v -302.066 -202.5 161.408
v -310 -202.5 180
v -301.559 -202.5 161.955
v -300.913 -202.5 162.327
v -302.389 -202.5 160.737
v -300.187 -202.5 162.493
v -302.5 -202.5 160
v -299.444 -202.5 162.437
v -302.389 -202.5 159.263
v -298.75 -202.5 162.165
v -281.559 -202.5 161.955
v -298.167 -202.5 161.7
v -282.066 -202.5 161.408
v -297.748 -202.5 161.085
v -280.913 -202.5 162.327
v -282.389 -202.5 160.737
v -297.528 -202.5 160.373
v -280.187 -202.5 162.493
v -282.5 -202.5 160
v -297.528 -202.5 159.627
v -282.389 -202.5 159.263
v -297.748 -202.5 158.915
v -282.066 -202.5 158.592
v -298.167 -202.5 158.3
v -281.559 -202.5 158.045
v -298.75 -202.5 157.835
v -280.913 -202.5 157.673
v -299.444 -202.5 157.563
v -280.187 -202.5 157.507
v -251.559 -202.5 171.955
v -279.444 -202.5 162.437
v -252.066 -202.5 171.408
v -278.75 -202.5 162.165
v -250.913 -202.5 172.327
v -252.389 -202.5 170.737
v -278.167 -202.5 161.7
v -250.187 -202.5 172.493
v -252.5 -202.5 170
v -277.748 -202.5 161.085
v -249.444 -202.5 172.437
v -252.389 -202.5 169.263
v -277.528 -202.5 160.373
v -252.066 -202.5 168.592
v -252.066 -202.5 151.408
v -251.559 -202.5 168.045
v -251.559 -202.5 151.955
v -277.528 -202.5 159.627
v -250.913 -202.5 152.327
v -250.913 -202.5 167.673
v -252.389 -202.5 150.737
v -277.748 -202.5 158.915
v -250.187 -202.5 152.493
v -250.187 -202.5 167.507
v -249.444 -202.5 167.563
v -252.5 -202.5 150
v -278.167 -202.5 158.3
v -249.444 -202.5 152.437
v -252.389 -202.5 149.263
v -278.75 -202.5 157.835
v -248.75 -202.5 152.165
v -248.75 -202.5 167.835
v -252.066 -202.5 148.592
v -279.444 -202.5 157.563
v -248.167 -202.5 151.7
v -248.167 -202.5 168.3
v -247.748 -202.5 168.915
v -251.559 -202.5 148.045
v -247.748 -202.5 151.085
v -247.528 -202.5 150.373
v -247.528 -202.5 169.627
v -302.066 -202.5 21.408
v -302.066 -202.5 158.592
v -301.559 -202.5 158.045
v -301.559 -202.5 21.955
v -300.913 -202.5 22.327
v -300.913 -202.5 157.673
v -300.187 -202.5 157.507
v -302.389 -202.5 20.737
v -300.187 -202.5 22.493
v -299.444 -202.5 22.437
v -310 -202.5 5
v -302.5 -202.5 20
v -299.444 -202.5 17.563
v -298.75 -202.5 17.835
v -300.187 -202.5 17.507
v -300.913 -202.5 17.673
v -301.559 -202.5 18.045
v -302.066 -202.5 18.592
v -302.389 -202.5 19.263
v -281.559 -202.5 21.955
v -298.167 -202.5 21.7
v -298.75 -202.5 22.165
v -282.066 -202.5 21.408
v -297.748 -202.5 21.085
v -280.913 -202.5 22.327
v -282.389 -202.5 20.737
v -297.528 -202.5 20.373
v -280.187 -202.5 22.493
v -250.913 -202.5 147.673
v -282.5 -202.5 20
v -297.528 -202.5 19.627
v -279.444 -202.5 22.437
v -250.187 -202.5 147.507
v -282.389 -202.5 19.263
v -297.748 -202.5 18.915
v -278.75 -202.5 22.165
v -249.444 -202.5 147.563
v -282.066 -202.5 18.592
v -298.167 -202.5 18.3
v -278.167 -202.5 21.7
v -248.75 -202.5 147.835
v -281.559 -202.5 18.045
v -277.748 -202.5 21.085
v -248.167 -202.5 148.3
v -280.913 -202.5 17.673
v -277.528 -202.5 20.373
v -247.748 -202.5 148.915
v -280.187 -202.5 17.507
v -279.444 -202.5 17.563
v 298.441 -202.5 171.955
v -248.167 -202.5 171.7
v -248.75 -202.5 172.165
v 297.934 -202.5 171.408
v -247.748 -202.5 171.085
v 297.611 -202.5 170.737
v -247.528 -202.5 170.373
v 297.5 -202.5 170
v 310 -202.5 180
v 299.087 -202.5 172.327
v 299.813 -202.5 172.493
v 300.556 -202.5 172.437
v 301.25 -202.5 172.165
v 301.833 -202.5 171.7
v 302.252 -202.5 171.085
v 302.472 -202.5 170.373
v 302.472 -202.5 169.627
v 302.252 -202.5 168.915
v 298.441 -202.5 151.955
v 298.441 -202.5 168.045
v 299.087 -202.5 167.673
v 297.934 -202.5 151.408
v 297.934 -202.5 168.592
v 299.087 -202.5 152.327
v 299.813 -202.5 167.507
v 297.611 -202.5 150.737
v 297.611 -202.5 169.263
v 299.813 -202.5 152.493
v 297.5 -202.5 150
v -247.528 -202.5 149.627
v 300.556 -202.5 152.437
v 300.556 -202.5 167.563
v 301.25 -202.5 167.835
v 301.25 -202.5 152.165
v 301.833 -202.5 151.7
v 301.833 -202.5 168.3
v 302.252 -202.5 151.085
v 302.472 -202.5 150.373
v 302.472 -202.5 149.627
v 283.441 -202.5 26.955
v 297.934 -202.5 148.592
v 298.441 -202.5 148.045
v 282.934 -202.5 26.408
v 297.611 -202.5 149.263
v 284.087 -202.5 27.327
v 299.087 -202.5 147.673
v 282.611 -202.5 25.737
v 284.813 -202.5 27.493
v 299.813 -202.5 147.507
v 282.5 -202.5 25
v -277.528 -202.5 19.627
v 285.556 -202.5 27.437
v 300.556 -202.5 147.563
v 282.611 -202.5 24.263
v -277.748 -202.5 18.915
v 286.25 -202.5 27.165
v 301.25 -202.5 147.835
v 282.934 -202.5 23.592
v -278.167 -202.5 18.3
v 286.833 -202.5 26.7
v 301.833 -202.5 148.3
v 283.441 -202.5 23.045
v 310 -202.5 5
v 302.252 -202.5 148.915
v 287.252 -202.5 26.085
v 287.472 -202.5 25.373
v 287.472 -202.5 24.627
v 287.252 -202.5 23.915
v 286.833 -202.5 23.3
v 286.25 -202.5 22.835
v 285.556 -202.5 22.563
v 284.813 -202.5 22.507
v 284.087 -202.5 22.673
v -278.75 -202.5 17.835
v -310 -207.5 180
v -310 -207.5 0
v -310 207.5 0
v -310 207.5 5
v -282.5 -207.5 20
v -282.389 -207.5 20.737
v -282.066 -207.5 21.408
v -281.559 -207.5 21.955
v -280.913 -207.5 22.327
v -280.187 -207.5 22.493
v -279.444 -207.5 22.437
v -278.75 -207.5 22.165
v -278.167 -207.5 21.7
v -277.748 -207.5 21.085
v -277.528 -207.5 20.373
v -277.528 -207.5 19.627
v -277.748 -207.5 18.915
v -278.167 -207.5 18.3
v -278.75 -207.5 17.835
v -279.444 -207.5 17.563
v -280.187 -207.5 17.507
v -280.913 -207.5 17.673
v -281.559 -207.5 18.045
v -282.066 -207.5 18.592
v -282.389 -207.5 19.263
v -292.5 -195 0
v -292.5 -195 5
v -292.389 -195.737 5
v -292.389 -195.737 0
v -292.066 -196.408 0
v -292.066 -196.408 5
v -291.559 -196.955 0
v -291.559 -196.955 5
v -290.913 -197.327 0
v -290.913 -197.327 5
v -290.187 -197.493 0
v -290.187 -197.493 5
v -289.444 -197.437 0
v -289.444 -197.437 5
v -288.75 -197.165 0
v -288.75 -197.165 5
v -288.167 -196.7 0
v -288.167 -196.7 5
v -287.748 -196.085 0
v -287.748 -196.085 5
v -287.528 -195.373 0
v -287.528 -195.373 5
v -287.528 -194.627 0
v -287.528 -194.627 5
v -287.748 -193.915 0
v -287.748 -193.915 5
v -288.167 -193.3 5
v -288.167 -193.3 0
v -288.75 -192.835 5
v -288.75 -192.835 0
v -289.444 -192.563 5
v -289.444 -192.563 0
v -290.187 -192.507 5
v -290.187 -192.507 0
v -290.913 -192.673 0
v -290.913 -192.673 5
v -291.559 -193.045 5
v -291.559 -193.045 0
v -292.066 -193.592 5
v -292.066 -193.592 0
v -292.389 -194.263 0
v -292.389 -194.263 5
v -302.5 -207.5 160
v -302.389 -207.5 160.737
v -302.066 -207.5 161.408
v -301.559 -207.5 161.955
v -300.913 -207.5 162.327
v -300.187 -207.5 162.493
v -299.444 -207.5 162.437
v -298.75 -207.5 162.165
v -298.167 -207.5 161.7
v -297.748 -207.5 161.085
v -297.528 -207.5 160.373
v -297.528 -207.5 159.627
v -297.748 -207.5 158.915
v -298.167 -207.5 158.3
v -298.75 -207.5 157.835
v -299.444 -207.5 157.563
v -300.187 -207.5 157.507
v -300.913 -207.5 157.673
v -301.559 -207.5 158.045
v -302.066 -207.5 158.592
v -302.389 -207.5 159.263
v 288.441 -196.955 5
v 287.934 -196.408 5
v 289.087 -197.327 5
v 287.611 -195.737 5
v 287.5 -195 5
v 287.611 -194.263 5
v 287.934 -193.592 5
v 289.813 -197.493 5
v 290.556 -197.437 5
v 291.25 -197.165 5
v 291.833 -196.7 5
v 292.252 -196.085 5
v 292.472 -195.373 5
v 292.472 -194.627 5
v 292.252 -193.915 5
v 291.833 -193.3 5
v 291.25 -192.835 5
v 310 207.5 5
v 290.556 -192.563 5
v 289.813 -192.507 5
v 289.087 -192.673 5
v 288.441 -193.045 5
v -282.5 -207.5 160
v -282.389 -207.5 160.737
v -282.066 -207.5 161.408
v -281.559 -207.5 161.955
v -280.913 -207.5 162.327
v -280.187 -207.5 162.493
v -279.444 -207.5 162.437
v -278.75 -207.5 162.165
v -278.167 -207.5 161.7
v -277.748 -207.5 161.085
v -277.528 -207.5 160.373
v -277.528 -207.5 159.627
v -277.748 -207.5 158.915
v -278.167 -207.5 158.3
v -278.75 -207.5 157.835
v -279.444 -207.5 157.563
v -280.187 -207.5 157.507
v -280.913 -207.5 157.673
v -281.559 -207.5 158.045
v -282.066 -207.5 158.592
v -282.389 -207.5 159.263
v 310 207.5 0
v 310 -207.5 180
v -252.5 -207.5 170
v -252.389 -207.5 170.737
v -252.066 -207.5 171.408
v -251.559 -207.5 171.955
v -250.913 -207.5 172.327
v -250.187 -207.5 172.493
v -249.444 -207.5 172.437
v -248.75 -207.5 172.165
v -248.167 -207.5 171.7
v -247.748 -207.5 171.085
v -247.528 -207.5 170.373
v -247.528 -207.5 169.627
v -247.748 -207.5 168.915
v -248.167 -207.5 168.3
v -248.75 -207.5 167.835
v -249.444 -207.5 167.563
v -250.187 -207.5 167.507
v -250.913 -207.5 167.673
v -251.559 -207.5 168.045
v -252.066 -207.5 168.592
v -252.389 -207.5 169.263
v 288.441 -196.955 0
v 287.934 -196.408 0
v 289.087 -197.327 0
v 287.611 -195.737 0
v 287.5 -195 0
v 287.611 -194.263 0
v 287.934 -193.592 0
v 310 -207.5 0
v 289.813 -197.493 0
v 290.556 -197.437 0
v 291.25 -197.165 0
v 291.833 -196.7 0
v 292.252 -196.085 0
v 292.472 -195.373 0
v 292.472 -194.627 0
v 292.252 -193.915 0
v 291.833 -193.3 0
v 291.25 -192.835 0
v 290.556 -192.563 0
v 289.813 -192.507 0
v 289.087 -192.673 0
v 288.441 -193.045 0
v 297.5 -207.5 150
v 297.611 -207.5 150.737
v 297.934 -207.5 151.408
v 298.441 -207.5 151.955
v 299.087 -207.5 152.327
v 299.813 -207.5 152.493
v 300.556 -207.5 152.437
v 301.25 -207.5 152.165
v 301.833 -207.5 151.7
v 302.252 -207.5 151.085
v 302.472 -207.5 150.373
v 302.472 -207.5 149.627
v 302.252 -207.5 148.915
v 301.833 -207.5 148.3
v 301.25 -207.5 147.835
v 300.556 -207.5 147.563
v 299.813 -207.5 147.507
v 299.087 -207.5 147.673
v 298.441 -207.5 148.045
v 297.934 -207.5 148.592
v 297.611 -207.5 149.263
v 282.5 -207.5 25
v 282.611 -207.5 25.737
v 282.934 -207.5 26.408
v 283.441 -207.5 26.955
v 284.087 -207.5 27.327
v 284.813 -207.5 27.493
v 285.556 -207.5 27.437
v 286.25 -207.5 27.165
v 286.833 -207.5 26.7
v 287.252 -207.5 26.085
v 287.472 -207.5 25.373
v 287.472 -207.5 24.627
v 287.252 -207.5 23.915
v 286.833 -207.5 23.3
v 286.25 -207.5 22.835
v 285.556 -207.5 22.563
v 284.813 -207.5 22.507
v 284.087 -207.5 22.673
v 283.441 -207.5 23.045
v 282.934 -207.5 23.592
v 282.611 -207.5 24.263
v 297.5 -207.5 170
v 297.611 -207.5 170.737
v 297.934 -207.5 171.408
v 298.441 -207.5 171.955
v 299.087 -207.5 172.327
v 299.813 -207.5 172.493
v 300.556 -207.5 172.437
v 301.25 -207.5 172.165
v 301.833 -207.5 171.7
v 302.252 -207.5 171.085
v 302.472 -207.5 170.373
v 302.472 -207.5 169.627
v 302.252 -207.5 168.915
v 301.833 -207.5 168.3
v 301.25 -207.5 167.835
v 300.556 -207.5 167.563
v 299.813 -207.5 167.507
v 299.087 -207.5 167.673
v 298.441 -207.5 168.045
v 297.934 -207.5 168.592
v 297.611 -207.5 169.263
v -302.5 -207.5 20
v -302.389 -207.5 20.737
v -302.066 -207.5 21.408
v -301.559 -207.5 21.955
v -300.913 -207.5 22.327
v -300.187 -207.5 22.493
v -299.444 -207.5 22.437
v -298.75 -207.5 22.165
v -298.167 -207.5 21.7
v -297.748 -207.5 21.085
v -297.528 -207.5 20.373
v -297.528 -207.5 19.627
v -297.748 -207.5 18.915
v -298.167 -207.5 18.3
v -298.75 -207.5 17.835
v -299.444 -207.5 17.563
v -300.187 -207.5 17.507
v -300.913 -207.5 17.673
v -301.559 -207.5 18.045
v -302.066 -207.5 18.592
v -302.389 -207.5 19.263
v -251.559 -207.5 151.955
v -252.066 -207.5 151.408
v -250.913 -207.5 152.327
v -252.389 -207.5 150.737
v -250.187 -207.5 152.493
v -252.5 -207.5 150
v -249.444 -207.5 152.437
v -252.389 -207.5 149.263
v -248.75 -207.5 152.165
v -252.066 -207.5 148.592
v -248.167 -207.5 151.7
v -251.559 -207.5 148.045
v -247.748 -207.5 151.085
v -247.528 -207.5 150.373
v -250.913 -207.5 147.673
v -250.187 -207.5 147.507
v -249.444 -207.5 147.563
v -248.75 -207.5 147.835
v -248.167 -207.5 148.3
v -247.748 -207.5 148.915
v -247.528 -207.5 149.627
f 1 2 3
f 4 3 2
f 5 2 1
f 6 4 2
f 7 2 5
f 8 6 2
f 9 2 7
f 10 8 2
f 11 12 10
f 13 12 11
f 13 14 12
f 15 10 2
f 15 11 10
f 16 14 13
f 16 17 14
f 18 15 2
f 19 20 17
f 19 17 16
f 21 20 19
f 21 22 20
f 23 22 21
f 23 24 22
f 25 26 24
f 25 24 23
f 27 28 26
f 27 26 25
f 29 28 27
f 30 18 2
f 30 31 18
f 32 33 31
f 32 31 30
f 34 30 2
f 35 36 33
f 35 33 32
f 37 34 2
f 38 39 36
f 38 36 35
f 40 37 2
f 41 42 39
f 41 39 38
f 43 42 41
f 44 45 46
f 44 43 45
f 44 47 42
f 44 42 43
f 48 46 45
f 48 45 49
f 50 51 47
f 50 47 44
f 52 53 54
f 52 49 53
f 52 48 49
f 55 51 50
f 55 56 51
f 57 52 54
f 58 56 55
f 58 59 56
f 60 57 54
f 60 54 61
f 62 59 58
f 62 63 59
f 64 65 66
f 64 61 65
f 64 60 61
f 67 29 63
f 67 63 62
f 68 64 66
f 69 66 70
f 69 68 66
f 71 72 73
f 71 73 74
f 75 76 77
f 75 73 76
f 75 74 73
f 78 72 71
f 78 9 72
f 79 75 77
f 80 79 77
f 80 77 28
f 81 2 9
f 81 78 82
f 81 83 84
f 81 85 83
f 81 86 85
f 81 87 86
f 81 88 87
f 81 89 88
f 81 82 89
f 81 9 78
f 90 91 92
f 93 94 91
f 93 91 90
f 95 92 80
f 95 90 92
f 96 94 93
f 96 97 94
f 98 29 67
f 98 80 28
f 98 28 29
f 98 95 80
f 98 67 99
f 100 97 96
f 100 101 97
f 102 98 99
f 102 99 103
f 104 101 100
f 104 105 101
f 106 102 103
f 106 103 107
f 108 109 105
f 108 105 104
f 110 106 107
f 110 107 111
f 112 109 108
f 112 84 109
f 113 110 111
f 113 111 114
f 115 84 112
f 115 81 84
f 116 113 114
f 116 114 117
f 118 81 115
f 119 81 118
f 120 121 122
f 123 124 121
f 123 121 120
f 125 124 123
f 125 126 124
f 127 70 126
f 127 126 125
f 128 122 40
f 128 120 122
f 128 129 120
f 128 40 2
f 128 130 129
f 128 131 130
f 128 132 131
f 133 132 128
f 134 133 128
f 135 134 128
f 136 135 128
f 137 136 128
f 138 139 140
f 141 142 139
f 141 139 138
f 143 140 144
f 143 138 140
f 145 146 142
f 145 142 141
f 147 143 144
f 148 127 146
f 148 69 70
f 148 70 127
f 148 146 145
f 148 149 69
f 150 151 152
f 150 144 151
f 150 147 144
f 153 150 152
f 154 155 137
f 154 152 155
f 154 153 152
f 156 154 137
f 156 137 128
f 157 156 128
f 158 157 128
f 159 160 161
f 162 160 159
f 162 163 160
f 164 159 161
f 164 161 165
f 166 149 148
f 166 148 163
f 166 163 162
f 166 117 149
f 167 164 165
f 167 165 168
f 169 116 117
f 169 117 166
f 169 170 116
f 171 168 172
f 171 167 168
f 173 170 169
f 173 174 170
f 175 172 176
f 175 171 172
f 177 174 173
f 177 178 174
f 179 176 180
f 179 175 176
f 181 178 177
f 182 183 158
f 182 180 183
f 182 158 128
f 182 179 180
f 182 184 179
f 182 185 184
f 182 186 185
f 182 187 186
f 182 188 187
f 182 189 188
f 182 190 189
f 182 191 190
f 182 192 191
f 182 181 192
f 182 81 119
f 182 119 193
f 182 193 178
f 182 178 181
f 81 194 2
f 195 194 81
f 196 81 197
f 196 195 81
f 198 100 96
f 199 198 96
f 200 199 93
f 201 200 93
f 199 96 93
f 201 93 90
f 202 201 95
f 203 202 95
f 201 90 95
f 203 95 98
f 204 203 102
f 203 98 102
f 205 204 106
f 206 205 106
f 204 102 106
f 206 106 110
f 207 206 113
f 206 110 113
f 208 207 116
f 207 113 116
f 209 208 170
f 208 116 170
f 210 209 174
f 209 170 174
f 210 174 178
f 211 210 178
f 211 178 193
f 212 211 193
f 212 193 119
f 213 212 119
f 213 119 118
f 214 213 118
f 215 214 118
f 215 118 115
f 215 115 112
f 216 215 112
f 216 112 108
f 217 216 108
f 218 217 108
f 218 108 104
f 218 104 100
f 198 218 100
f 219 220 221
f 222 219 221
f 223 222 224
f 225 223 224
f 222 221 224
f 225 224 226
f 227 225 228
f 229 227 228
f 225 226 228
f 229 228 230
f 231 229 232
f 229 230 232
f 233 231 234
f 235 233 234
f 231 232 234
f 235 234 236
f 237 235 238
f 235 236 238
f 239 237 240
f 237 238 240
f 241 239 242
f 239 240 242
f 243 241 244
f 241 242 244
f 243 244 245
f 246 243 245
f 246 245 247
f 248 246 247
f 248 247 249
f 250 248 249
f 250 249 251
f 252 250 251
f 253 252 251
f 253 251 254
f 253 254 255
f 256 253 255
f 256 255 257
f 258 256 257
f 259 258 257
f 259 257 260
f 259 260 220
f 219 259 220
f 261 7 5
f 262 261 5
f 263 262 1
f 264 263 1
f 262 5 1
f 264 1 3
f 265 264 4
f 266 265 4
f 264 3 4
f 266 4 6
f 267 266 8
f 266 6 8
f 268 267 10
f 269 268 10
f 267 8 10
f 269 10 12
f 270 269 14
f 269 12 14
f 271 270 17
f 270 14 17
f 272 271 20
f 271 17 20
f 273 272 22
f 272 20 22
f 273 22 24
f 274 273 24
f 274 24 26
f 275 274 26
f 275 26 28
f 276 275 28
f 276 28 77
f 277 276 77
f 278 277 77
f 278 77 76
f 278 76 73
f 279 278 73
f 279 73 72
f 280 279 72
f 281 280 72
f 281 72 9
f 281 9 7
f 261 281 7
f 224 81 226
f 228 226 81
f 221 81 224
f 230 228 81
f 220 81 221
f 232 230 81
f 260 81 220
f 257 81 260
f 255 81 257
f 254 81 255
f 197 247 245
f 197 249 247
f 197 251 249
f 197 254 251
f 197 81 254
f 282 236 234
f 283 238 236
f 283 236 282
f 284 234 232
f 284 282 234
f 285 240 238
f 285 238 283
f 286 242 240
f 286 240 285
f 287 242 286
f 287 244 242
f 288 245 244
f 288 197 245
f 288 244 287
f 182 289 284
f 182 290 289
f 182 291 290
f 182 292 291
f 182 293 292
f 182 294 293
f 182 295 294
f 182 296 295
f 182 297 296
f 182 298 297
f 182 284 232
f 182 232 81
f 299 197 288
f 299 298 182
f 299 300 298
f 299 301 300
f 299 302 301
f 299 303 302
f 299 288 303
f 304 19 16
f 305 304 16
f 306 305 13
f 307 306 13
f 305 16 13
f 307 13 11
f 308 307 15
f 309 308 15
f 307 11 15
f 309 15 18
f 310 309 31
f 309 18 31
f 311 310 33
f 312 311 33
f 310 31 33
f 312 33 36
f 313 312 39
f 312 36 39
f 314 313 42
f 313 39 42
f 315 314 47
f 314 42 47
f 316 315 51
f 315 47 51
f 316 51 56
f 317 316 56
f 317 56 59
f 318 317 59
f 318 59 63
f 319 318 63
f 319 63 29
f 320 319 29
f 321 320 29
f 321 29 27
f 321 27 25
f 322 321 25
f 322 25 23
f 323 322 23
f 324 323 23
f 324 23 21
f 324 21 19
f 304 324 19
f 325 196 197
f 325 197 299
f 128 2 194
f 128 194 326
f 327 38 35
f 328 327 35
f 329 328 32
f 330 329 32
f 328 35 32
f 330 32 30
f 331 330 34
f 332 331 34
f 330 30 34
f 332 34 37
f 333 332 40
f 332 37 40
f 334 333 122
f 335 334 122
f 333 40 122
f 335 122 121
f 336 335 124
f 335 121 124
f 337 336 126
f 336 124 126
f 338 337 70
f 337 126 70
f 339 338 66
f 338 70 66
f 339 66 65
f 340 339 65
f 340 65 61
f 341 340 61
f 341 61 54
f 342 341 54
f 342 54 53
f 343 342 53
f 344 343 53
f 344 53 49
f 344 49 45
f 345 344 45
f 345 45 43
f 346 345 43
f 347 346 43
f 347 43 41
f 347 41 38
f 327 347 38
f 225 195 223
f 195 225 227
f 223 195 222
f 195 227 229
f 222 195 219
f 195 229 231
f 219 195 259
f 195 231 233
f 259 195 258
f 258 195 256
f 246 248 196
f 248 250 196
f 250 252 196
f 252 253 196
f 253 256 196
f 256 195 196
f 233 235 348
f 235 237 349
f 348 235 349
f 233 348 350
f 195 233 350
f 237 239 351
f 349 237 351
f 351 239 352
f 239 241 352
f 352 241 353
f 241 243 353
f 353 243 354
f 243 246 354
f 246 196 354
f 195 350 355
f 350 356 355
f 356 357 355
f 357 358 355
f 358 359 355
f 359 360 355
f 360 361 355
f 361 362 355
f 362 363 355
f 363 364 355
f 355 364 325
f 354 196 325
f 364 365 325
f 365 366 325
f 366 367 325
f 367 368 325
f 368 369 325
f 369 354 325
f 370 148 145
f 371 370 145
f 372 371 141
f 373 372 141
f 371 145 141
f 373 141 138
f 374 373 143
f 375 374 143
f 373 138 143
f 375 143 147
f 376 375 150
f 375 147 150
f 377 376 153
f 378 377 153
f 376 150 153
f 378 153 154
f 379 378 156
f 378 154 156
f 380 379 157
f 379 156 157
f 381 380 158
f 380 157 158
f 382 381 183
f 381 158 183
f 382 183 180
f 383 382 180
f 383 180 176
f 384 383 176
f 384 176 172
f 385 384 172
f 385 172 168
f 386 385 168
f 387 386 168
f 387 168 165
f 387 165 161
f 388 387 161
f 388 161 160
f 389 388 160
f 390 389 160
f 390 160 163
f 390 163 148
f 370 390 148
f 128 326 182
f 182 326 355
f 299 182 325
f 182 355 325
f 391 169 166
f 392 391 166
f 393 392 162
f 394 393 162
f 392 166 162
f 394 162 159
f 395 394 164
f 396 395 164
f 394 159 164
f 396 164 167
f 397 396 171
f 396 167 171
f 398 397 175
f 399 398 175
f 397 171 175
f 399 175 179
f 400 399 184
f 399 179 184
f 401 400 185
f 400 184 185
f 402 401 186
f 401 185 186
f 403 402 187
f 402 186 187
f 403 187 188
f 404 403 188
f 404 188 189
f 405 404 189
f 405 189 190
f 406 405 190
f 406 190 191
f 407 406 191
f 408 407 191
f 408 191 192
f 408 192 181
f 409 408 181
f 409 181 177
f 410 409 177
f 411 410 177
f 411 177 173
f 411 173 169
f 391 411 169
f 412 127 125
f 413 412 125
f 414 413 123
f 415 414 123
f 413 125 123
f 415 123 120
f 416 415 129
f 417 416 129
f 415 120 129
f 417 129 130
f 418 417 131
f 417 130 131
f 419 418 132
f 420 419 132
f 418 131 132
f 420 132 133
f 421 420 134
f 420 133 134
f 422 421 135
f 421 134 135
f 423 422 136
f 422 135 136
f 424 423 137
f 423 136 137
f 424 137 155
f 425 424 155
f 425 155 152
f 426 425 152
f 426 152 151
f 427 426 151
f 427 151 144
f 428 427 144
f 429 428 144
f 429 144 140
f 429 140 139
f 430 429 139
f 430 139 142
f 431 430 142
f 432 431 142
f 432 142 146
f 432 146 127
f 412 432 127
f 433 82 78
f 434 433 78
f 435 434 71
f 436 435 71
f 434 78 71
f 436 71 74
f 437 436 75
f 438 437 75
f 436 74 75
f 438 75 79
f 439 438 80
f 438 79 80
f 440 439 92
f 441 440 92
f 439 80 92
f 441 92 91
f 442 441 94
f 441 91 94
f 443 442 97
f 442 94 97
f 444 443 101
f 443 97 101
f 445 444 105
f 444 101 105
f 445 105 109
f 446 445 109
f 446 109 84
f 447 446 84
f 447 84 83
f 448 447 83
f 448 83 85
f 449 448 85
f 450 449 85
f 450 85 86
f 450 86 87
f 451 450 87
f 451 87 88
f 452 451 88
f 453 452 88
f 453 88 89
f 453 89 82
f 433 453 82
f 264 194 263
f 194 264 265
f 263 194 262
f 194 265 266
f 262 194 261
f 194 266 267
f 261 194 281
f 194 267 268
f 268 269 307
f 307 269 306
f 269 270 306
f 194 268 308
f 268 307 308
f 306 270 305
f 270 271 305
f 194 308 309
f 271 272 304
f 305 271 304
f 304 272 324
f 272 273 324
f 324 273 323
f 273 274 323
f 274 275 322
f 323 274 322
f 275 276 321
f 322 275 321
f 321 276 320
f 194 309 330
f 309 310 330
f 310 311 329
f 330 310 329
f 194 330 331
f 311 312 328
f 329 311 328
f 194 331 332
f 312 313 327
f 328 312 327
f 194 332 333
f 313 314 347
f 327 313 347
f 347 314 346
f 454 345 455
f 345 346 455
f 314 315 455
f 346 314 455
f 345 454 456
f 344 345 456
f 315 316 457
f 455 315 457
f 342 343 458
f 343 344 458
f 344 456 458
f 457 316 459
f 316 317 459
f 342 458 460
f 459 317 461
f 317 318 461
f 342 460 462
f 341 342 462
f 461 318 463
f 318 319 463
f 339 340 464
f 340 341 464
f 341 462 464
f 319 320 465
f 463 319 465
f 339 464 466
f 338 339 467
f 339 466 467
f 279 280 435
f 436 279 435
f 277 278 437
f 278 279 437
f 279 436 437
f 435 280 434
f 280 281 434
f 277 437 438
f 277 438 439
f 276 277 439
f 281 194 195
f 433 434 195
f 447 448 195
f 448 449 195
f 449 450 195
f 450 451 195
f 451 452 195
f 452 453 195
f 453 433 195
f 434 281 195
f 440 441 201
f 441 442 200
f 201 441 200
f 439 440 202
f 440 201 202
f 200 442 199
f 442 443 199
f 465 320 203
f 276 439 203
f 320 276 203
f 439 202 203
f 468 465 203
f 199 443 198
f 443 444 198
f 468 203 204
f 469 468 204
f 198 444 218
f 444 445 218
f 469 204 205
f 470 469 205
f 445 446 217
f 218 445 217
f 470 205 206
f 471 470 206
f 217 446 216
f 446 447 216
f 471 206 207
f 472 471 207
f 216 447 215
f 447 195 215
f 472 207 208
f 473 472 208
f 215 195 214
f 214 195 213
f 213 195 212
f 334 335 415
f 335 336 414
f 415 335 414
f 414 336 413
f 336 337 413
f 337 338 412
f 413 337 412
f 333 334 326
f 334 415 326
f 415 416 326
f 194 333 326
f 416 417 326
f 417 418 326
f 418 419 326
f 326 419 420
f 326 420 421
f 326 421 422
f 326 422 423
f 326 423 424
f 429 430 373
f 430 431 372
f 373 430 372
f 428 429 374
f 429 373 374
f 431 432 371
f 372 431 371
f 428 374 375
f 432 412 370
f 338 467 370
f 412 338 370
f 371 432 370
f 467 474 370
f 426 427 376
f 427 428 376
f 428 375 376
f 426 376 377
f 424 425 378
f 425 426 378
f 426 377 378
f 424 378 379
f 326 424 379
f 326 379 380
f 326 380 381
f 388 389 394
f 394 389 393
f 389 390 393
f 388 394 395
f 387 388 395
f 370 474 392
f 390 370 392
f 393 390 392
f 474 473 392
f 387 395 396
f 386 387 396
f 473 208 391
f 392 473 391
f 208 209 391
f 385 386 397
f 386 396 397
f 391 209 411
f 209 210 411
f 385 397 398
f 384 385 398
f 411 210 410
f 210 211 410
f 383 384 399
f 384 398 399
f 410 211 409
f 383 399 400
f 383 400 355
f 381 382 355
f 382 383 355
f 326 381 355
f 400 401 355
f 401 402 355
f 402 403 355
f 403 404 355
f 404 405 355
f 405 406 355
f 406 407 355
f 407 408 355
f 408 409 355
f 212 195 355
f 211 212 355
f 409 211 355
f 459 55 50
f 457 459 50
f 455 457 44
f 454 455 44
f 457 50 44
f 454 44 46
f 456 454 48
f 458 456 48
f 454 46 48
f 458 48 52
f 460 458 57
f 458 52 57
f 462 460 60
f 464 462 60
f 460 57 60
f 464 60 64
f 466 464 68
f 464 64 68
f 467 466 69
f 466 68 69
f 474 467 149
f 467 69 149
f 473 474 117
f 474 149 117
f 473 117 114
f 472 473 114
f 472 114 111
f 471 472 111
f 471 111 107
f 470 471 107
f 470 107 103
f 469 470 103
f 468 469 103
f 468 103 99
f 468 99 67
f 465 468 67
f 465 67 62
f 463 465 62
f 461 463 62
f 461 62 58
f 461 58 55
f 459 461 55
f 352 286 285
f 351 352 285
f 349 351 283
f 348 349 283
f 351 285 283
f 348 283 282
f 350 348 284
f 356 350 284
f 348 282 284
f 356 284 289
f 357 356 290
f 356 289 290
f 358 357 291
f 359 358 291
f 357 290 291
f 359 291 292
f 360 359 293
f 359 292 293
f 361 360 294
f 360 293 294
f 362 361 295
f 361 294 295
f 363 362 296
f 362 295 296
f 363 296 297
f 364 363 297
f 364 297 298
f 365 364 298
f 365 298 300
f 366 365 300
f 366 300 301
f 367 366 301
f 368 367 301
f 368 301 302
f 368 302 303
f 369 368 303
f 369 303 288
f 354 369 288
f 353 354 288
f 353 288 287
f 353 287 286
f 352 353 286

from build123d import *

# Parameters (mm, degrees)
F0_W      = 620
F0_H      = 415
F1_DEPTH  = 5
F2_W      = 620
F2_H      = 5
F3_DEPTH  = 175
F5_D      = 5
F7_D      = 5
F9_D      = 5
F11_D     = 5
F15_D     = 5
F17_D     = 5
F19_D     = 5
F19_DEPTH = 11
F20_D     = 5
F20_DEPTH = 11


with BuildPart() as f1:
    # F0 (on Top) → F1 (new body)
    with BuildSketch(Plane.XY):
        Rectangle(F0_W, F0_H)
    extrude(amount=F1_DEPTH)

    # F2 (on face) → F3 (join)
    with BuildSketch(Plane.XY.offset(5)):
        with Locations((0, -205)):
            Rectangle(F2_W, F2_H)
    extrude(amount=F3_DEPTH)

    # F5 (through all)
    with Locations(Plane.XZ.offset(207.5)):
        with Locations((300, 170)):
            Hole(F5_D / 2)

    # F7 (through all)
    with Locations(Plane.XZ.offset(207.5)):
        with Locations((300, 150)):
            Hole(F7_D / 2)

    # F9 (through all)
    with Locations(Plane.XZ.offset(207.5)):
        with Locations((-250, 170)):
            Hole(F9_D / 2)

    # F11 (through all)
    with Locations(Plane.XZ.offset(207.5)):
        with Locations((-250, 150)):
            Hole(F11_D / 2)

    # F15 (through all)
    with Locations(Plane(origin=(0, 0, 0), x_dir=(1, 0, 0), z_dir=(0, 0, -1))):
        with Locations((290, 195)):
            Hole(F15_D / 2)

    # F17 (through all)
    with Locations(Plane(origin=(0, 0, 0), x_dir=(1, 0, 0), z_dir=(0, 0, -1))):
        with Locations((-290, 195)):
            Hole(F17_D / 2)

    # F19
    with Locations(Plane.XZ.offset(207.5)):
        with Locations((285, 25)):
            Hole(F19_D / 2, depth=F19_DEPTH)

    # F20
    with Locations(Plane.XZ.offset(207.5)):
        with Locations((-300, 20), (-280, 20), (-300, 160), (-280, 160)):
            Hole(F20_D / 2, depth=F20_DEPTH)


solid = f1.part
